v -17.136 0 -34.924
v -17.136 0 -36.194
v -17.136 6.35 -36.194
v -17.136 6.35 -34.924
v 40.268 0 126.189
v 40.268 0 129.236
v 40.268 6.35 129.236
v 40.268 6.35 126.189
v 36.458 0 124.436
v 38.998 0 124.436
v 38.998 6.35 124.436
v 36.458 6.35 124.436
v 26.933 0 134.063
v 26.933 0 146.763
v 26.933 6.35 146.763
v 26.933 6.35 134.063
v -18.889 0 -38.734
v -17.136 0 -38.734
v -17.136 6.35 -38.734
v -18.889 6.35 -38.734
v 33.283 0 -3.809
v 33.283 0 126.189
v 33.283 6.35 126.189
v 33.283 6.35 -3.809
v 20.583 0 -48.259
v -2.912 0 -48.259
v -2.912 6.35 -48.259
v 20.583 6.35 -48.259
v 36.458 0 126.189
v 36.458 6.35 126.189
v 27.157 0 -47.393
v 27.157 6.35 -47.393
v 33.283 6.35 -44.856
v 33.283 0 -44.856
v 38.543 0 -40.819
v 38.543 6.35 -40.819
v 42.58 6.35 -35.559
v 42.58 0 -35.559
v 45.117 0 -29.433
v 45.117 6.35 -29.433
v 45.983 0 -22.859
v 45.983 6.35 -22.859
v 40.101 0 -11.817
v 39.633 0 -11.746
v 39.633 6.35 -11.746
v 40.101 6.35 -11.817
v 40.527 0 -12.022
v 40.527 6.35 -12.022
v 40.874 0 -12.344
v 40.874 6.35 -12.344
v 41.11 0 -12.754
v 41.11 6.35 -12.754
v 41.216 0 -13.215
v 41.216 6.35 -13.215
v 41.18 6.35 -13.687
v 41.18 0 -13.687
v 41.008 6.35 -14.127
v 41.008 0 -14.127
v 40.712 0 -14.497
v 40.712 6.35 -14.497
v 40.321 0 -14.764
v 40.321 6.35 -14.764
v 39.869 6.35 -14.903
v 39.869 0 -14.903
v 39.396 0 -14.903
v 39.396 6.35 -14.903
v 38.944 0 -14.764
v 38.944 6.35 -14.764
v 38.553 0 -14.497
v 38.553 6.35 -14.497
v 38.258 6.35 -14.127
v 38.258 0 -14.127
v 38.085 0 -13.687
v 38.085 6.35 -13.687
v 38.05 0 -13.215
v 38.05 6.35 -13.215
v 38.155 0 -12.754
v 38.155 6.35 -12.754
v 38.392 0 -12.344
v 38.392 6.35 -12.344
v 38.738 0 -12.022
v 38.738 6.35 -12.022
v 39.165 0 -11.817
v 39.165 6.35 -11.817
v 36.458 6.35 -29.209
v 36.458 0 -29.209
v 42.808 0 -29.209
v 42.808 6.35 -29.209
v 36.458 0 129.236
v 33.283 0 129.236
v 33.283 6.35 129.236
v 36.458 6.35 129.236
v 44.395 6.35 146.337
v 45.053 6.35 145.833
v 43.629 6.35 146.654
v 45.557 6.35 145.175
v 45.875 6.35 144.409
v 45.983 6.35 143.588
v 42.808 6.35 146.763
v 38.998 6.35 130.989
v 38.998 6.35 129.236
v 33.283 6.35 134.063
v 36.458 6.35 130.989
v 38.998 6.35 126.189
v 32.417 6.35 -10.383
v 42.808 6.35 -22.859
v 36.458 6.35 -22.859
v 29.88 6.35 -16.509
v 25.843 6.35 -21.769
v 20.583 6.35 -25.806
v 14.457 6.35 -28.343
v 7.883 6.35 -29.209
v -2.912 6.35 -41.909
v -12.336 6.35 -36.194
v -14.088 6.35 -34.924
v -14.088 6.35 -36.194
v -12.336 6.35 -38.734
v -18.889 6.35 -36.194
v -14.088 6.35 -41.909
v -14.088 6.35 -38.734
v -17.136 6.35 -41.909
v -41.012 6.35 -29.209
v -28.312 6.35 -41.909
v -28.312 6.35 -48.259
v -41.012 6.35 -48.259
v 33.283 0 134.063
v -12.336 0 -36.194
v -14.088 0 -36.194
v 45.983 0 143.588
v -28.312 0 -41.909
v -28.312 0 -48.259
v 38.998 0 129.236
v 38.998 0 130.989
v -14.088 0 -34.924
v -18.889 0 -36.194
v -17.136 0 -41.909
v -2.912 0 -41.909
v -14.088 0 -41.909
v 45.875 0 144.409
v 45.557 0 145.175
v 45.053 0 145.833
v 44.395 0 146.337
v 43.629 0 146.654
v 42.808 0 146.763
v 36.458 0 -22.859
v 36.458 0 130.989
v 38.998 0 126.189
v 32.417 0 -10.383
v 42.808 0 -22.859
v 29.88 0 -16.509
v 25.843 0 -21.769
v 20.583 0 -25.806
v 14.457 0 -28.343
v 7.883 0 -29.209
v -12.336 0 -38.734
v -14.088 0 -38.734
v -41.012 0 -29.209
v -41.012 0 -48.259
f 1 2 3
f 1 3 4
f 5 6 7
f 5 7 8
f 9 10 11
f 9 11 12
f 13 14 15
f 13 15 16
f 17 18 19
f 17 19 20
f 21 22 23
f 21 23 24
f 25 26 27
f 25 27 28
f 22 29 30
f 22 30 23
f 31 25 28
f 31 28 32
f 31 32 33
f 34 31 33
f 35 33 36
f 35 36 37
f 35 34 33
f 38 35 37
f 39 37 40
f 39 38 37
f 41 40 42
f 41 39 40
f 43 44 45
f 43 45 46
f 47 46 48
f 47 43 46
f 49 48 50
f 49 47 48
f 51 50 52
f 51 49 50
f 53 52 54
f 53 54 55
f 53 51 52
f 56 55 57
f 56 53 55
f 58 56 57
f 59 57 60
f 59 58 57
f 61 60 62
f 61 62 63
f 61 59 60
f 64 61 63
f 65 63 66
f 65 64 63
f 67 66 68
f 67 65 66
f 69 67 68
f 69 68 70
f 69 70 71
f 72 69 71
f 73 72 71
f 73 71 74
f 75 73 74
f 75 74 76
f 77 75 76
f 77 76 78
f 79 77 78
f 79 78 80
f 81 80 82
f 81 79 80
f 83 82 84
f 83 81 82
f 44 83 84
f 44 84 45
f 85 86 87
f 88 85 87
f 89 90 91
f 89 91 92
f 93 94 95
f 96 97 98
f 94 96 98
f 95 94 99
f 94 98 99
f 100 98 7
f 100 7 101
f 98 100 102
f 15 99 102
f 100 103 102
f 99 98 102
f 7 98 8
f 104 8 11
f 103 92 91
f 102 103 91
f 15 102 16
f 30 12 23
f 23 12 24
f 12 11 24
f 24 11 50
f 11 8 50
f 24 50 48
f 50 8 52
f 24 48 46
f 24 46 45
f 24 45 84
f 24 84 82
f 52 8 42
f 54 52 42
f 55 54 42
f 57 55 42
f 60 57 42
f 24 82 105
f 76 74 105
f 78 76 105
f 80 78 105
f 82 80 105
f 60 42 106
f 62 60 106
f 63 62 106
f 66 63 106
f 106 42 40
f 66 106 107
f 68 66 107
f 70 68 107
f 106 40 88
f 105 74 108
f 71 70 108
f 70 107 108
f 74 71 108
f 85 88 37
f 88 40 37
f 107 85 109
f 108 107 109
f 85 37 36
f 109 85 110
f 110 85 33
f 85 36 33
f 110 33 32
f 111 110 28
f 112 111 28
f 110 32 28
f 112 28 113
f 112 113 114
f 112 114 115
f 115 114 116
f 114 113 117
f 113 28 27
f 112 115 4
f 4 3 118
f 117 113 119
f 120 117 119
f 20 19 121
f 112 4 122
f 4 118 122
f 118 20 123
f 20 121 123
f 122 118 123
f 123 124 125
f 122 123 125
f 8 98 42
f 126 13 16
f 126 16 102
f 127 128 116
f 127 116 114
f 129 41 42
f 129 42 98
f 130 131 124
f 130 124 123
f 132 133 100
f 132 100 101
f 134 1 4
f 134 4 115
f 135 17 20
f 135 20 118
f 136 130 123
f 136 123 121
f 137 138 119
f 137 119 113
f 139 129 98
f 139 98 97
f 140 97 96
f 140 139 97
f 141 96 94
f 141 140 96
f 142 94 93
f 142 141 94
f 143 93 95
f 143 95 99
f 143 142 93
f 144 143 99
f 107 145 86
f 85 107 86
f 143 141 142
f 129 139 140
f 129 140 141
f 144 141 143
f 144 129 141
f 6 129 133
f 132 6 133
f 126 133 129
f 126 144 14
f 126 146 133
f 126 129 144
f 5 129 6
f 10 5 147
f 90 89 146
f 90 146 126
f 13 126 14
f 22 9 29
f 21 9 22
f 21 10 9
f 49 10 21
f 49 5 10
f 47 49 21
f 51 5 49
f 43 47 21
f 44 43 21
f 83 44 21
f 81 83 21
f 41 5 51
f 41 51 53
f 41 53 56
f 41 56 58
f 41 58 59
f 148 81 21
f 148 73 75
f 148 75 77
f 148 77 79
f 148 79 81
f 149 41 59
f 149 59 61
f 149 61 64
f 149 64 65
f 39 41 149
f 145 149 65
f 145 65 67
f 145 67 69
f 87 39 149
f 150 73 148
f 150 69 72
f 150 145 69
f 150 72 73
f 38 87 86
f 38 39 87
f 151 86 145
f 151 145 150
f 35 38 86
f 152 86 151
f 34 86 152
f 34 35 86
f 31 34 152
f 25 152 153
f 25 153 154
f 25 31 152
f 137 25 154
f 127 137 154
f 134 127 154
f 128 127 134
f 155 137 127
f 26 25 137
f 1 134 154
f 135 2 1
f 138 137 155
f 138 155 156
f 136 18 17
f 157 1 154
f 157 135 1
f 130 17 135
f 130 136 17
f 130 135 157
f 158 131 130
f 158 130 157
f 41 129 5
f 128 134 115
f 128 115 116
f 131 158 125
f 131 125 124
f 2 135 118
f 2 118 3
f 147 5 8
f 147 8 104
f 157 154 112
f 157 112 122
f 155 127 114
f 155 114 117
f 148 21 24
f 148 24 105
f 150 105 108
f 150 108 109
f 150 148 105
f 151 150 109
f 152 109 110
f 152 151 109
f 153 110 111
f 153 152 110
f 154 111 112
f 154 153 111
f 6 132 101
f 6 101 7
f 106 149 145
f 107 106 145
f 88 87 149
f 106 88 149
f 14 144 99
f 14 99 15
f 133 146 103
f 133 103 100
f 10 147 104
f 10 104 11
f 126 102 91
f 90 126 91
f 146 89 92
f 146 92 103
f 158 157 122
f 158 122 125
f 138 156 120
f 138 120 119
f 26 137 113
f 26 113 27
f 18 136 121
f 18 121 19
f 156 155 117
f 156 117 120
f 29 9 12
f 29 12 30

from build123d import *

# Parameters (mm, degrees)
SKETCH1_R           = 1.5875
BOSS_EXTRUDE1_DEPTH = 6.35


with BuildPart() as part:
    # Sketch1 → Boss-Extrude1 (new body)
    with BuildSketch(Plane(origin=(0, 0, 0), x_dir=(1, 0, 0), z_dir=(0, 1, 0))):
        with BuildLine():
            Line((7.882687692, 29.208698466), (-41.012312308, 29.208698466))
            Line((-41.012312308, 29.208698466), (-41.012312308, 48.258698466))
            Line((-41.012312308, 48.258698466), (-28.312312308, 48.258698466))
            Line((-28.312312308, 48.258698466), (-28.312312308, 41.908698466))
            Line((-28.312312308, 41.908698466), (-17.136241986, 41.908698466))
            Line((-17.136241986, 41.908698466), (-17.136241986, 38.733698466))
            Line((-17.136241986, 38.733698466), (-18.888841986, 38.733698466))
            Line((-18.888841986, 38.733698466), (-18.888841986, 36.193698466))
            Line((-18.888841986, 36.193698466), (-17.136241986, 36.193698466))
            Line((-17.136241986, 36.193698466), (-17.136241986, 34.923698466))
            Line((-17.136241986, 34.923698466), (-14.08838263, 34.923698466))
            Line((-14.08838263, 34.923698466), (-14.08838263, 36.193698466))
            Line((-14.08838263, 36.193698466), (-12.33578263, 36.193698466))
            Line((-12.33578263, 36.193698466), (-12.33578263, 38.733698466))
            Line((-12.33578263, 38.733698466), (-14.08838263, 38.733698466))
            Line((-14.08838263, 38.733698466), (-14.08838263, 41.908698466))
            Line((-14.08838263, 41.908698466), (-2.912312308, 41.908698466))
            Line((-2.912312308, 41.908698466), (-2.912312308, 48.258698466))
            Line((-2.912312308, 48.258698466), (20.582687692, 48.258698466))
            ThreePointArc((20.582687692, 48.258698466), (38.543199934, 40.819210709), (45.982687692, 22.858698466))
            Line((45.982687692, 22.858698466), (45.982687692, -143.587501534))
            ThreePointArc((45.982687692, -143.587501534), (45.052751722, -145.832565564), (42.807687692, -146.762501534))
            Line((42.807687692, -146.762501534), (33.282687692, -146.762501534))
            Line((33.282687692, -146.762501534), (26.932687692, -146.762501534))
            Line((26.932687692, -146.762501534), (26.932687692, -134.062501534))
            Line((26.932687692, -134.062501534), (33.282687692, -134.062501534))
            Line((33.282687692, -134.062501534), (33.282687692, -129.236431212))
            Line((33.282687692, -129.236431212), (36.457687692, -129.236431212))
            Line((36.457687692, -129.236431212), (36.457687692, -130.989031212))
            Line((36.457687692, -130.989031212), (38.997687692, -130.989031212))
            Line((38.997687692, -130.989031212), (38.997687692, -129.236431212))
            Line((38.997687692, -129.236431212), (40.267687692, -129.236431212))
            Line((40.267687692, -129.236431212), (40.267687692, -126.188571855))
            Line((40.267687692, -126.188571855), (38.997687692, -126.188571855))
            Line((38.997687692, -126.188571855), (38.997687692, -124.435971855))
            Line((38.997687692, -124.435971855), (36.457687692, -124.435971855))
            Line((36.457687692, -124.435971855), (36.457687692, -126.188571855))
            Line((36.457687692, -126.188571855), (33.282687692, -126.188571855))
            Line((33.282687692, -126.188571855), (33.282687692, -121.362501534))
            Line((33.282687692, -121.362501534), (33.282687692, 3.808698466))
            ThreePointArc((33.282687692, 3.808698466), (25.843199934, 21.769210709), (7.882687692, 29.208698466))
        make_face()
        with Locations(Location((39.632687692, 13.333698466, 0), (0, 0, 270))):
            Circle(SKETCH1_R, mode=Mode.SUBTRACT)
        Polygon((39.632687692, 29.208698466), (42.807687692, 29.208698466), (42.807687692, 22.858698466), (36.457687692, 22.858698466), (36.457687692, 29.208698466), align=None, mode=Mode.SUBTRACT)
    extrude(amount=BOSS_EXTRUDE1_DEPTH)


solid = part.part
